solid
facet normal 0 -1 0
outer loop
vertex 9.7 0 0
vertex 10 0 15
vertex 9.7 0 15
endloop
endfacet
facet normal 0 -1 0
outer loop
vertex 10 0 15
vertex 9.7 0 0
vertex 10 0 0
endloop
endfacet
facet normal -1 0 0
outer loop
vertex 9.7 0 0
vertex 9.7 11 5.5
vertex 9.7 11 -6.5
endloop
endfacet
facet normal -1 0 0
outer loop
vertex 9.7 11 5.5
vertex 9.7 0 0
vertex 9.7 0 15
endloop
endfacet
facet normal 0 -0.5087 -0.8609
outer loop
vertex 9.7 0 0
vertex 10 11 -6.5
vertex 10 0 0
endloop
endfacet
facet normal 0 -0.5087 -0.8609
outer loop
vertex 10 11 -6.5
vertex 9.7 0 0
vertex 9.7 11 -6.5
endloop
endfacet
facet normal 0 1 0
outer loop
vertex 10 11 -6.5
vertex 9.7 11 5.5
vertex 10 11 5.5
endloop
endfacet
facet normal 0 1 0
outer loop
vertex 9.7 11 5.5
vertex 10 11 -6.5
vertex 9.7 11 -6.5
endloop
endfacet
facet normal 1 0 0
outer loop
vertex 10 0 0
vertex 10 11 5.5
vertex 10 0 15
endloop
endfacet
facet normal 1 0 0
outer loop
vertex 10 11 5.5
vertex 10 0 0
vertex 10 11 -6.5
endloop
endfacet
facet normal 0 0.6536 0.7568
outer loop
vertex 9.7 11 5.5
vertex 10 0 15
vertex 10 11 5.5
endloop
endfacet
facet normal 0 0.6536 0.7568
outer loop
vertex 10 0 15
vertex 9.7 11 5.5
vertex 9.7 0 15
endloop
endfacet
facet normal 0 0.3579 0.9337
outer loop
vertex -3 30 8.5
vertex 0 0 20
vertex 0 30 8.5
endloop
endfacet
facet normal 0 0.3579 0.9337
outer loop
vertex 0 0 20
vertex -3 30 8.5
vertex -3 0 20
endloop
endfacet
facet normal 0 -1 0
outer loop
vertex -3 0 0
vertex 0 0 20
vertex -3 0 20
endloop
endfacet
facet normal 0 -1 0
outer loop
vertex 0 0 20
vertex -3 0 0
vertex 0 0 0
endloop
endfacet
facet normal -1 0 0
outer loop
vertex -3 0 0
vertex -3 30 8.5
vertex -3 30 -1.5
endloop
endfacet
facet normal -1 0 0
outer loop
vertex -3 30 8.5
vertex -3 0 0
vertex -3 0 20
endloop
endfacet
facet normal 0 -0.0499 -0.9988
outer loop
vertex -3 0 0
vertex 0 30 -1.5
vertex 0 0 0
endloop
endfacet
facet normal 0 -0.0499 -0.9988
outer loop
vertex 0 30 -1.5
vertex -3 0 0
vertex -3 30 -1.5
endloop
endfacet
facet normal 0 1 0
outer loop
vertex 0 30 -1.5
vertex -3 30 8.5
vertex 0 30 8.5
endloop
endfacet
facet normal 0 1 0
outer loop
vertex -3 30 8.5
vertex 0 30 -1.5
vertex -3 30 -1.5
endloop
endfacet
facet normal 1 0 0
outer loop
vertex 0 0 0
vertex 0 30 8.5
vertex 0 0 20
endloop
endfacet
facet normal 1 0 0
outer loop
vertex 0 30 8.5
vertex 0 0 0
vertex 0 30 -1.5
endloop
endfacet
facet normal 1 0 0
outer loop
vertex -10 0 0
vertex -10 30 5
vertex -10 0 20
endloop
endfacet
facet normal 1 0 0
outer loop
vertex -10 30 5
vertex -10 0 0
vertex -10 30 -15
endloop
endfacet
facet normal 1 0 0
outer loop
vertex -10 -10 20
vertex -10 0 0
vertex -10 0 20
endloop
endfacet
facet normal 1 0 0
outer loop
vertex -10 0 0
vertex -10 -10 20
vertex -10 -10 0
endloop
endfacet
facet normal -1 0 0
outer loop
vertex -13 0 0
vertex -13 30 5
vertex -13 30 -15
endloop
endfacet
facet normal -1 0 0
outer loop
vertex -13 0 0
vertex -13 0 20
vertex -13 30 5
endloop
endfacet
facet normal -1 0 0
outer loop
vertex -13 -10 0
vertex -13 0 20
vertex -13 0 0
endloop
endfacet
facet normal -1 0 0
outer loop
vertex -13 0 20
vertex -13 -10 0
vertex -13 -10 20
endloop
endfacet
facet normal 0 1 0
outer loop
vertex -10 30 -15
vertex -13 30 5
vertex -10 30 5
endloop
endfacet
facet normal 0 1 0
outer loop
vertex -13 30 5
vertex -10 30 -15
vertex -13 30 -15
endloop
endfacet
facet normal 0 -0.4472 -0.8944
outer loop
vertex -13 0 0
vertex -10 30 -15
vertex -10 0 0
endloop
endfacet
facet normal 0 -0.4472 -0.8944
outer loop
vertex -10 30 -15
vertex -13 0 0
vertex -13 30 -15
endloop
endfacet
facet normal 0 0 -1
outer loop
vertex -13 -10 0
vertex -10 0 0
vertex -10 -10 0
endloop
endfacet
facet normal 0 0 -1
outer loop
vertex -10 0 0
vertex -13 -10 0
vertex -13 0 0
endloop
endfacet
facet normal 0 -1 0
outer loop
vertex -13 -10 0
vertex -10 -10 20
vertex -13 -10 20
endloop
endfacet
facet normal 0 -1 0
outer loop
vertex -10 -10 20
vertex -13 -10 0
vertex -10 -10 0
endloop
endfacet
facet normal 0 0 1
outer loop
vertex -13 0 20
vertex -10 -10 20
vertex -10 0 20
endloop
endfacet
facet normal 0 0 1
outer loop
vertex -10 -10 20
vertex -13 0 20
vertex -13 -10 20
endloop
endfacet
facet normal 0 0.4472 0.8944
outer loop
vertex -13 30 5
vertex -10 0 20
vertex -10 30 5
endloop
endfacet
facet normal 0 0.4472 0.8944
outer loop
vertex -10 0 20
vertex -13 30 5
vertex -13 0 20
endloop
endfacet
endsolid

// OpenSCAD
module surface_trap(root_chord, tip_chord, height, sweep, thickness)
{
    translate([0, 0, root_chord])
    rotate([-90, 0, 0])
    rotate([0, -90, 0])
    linear_extrude(thickness)
    polygon([[0, 0], [0, root_chord], [height, tip_chord+sweep], [height, sweep]]);
}

module deep_trap(root_chord, tip_chord, height, sweep, depth, thickness)
{
    translate([0, 0, root_chord])
    rotate([-90, 0, 0])
    rotate([0, -90, 0])
    linear_extrude(thickness)
    polygon([[0, 0], [-depth, 0], [-depth, root_chord],  [0, root_chord], [height, tip_chord+sweep], [height, sweep]]);
}

color("green")
translate([10, 0, 0])
surface_trap(15, 12, 11, 9.5, 0.3);



surface_trap(20, 10, 30, 11.5, 3);

color("orange")
translate([-10, 0, 0])
deep_trap(20, 20, 30, 15, 10, 3);
